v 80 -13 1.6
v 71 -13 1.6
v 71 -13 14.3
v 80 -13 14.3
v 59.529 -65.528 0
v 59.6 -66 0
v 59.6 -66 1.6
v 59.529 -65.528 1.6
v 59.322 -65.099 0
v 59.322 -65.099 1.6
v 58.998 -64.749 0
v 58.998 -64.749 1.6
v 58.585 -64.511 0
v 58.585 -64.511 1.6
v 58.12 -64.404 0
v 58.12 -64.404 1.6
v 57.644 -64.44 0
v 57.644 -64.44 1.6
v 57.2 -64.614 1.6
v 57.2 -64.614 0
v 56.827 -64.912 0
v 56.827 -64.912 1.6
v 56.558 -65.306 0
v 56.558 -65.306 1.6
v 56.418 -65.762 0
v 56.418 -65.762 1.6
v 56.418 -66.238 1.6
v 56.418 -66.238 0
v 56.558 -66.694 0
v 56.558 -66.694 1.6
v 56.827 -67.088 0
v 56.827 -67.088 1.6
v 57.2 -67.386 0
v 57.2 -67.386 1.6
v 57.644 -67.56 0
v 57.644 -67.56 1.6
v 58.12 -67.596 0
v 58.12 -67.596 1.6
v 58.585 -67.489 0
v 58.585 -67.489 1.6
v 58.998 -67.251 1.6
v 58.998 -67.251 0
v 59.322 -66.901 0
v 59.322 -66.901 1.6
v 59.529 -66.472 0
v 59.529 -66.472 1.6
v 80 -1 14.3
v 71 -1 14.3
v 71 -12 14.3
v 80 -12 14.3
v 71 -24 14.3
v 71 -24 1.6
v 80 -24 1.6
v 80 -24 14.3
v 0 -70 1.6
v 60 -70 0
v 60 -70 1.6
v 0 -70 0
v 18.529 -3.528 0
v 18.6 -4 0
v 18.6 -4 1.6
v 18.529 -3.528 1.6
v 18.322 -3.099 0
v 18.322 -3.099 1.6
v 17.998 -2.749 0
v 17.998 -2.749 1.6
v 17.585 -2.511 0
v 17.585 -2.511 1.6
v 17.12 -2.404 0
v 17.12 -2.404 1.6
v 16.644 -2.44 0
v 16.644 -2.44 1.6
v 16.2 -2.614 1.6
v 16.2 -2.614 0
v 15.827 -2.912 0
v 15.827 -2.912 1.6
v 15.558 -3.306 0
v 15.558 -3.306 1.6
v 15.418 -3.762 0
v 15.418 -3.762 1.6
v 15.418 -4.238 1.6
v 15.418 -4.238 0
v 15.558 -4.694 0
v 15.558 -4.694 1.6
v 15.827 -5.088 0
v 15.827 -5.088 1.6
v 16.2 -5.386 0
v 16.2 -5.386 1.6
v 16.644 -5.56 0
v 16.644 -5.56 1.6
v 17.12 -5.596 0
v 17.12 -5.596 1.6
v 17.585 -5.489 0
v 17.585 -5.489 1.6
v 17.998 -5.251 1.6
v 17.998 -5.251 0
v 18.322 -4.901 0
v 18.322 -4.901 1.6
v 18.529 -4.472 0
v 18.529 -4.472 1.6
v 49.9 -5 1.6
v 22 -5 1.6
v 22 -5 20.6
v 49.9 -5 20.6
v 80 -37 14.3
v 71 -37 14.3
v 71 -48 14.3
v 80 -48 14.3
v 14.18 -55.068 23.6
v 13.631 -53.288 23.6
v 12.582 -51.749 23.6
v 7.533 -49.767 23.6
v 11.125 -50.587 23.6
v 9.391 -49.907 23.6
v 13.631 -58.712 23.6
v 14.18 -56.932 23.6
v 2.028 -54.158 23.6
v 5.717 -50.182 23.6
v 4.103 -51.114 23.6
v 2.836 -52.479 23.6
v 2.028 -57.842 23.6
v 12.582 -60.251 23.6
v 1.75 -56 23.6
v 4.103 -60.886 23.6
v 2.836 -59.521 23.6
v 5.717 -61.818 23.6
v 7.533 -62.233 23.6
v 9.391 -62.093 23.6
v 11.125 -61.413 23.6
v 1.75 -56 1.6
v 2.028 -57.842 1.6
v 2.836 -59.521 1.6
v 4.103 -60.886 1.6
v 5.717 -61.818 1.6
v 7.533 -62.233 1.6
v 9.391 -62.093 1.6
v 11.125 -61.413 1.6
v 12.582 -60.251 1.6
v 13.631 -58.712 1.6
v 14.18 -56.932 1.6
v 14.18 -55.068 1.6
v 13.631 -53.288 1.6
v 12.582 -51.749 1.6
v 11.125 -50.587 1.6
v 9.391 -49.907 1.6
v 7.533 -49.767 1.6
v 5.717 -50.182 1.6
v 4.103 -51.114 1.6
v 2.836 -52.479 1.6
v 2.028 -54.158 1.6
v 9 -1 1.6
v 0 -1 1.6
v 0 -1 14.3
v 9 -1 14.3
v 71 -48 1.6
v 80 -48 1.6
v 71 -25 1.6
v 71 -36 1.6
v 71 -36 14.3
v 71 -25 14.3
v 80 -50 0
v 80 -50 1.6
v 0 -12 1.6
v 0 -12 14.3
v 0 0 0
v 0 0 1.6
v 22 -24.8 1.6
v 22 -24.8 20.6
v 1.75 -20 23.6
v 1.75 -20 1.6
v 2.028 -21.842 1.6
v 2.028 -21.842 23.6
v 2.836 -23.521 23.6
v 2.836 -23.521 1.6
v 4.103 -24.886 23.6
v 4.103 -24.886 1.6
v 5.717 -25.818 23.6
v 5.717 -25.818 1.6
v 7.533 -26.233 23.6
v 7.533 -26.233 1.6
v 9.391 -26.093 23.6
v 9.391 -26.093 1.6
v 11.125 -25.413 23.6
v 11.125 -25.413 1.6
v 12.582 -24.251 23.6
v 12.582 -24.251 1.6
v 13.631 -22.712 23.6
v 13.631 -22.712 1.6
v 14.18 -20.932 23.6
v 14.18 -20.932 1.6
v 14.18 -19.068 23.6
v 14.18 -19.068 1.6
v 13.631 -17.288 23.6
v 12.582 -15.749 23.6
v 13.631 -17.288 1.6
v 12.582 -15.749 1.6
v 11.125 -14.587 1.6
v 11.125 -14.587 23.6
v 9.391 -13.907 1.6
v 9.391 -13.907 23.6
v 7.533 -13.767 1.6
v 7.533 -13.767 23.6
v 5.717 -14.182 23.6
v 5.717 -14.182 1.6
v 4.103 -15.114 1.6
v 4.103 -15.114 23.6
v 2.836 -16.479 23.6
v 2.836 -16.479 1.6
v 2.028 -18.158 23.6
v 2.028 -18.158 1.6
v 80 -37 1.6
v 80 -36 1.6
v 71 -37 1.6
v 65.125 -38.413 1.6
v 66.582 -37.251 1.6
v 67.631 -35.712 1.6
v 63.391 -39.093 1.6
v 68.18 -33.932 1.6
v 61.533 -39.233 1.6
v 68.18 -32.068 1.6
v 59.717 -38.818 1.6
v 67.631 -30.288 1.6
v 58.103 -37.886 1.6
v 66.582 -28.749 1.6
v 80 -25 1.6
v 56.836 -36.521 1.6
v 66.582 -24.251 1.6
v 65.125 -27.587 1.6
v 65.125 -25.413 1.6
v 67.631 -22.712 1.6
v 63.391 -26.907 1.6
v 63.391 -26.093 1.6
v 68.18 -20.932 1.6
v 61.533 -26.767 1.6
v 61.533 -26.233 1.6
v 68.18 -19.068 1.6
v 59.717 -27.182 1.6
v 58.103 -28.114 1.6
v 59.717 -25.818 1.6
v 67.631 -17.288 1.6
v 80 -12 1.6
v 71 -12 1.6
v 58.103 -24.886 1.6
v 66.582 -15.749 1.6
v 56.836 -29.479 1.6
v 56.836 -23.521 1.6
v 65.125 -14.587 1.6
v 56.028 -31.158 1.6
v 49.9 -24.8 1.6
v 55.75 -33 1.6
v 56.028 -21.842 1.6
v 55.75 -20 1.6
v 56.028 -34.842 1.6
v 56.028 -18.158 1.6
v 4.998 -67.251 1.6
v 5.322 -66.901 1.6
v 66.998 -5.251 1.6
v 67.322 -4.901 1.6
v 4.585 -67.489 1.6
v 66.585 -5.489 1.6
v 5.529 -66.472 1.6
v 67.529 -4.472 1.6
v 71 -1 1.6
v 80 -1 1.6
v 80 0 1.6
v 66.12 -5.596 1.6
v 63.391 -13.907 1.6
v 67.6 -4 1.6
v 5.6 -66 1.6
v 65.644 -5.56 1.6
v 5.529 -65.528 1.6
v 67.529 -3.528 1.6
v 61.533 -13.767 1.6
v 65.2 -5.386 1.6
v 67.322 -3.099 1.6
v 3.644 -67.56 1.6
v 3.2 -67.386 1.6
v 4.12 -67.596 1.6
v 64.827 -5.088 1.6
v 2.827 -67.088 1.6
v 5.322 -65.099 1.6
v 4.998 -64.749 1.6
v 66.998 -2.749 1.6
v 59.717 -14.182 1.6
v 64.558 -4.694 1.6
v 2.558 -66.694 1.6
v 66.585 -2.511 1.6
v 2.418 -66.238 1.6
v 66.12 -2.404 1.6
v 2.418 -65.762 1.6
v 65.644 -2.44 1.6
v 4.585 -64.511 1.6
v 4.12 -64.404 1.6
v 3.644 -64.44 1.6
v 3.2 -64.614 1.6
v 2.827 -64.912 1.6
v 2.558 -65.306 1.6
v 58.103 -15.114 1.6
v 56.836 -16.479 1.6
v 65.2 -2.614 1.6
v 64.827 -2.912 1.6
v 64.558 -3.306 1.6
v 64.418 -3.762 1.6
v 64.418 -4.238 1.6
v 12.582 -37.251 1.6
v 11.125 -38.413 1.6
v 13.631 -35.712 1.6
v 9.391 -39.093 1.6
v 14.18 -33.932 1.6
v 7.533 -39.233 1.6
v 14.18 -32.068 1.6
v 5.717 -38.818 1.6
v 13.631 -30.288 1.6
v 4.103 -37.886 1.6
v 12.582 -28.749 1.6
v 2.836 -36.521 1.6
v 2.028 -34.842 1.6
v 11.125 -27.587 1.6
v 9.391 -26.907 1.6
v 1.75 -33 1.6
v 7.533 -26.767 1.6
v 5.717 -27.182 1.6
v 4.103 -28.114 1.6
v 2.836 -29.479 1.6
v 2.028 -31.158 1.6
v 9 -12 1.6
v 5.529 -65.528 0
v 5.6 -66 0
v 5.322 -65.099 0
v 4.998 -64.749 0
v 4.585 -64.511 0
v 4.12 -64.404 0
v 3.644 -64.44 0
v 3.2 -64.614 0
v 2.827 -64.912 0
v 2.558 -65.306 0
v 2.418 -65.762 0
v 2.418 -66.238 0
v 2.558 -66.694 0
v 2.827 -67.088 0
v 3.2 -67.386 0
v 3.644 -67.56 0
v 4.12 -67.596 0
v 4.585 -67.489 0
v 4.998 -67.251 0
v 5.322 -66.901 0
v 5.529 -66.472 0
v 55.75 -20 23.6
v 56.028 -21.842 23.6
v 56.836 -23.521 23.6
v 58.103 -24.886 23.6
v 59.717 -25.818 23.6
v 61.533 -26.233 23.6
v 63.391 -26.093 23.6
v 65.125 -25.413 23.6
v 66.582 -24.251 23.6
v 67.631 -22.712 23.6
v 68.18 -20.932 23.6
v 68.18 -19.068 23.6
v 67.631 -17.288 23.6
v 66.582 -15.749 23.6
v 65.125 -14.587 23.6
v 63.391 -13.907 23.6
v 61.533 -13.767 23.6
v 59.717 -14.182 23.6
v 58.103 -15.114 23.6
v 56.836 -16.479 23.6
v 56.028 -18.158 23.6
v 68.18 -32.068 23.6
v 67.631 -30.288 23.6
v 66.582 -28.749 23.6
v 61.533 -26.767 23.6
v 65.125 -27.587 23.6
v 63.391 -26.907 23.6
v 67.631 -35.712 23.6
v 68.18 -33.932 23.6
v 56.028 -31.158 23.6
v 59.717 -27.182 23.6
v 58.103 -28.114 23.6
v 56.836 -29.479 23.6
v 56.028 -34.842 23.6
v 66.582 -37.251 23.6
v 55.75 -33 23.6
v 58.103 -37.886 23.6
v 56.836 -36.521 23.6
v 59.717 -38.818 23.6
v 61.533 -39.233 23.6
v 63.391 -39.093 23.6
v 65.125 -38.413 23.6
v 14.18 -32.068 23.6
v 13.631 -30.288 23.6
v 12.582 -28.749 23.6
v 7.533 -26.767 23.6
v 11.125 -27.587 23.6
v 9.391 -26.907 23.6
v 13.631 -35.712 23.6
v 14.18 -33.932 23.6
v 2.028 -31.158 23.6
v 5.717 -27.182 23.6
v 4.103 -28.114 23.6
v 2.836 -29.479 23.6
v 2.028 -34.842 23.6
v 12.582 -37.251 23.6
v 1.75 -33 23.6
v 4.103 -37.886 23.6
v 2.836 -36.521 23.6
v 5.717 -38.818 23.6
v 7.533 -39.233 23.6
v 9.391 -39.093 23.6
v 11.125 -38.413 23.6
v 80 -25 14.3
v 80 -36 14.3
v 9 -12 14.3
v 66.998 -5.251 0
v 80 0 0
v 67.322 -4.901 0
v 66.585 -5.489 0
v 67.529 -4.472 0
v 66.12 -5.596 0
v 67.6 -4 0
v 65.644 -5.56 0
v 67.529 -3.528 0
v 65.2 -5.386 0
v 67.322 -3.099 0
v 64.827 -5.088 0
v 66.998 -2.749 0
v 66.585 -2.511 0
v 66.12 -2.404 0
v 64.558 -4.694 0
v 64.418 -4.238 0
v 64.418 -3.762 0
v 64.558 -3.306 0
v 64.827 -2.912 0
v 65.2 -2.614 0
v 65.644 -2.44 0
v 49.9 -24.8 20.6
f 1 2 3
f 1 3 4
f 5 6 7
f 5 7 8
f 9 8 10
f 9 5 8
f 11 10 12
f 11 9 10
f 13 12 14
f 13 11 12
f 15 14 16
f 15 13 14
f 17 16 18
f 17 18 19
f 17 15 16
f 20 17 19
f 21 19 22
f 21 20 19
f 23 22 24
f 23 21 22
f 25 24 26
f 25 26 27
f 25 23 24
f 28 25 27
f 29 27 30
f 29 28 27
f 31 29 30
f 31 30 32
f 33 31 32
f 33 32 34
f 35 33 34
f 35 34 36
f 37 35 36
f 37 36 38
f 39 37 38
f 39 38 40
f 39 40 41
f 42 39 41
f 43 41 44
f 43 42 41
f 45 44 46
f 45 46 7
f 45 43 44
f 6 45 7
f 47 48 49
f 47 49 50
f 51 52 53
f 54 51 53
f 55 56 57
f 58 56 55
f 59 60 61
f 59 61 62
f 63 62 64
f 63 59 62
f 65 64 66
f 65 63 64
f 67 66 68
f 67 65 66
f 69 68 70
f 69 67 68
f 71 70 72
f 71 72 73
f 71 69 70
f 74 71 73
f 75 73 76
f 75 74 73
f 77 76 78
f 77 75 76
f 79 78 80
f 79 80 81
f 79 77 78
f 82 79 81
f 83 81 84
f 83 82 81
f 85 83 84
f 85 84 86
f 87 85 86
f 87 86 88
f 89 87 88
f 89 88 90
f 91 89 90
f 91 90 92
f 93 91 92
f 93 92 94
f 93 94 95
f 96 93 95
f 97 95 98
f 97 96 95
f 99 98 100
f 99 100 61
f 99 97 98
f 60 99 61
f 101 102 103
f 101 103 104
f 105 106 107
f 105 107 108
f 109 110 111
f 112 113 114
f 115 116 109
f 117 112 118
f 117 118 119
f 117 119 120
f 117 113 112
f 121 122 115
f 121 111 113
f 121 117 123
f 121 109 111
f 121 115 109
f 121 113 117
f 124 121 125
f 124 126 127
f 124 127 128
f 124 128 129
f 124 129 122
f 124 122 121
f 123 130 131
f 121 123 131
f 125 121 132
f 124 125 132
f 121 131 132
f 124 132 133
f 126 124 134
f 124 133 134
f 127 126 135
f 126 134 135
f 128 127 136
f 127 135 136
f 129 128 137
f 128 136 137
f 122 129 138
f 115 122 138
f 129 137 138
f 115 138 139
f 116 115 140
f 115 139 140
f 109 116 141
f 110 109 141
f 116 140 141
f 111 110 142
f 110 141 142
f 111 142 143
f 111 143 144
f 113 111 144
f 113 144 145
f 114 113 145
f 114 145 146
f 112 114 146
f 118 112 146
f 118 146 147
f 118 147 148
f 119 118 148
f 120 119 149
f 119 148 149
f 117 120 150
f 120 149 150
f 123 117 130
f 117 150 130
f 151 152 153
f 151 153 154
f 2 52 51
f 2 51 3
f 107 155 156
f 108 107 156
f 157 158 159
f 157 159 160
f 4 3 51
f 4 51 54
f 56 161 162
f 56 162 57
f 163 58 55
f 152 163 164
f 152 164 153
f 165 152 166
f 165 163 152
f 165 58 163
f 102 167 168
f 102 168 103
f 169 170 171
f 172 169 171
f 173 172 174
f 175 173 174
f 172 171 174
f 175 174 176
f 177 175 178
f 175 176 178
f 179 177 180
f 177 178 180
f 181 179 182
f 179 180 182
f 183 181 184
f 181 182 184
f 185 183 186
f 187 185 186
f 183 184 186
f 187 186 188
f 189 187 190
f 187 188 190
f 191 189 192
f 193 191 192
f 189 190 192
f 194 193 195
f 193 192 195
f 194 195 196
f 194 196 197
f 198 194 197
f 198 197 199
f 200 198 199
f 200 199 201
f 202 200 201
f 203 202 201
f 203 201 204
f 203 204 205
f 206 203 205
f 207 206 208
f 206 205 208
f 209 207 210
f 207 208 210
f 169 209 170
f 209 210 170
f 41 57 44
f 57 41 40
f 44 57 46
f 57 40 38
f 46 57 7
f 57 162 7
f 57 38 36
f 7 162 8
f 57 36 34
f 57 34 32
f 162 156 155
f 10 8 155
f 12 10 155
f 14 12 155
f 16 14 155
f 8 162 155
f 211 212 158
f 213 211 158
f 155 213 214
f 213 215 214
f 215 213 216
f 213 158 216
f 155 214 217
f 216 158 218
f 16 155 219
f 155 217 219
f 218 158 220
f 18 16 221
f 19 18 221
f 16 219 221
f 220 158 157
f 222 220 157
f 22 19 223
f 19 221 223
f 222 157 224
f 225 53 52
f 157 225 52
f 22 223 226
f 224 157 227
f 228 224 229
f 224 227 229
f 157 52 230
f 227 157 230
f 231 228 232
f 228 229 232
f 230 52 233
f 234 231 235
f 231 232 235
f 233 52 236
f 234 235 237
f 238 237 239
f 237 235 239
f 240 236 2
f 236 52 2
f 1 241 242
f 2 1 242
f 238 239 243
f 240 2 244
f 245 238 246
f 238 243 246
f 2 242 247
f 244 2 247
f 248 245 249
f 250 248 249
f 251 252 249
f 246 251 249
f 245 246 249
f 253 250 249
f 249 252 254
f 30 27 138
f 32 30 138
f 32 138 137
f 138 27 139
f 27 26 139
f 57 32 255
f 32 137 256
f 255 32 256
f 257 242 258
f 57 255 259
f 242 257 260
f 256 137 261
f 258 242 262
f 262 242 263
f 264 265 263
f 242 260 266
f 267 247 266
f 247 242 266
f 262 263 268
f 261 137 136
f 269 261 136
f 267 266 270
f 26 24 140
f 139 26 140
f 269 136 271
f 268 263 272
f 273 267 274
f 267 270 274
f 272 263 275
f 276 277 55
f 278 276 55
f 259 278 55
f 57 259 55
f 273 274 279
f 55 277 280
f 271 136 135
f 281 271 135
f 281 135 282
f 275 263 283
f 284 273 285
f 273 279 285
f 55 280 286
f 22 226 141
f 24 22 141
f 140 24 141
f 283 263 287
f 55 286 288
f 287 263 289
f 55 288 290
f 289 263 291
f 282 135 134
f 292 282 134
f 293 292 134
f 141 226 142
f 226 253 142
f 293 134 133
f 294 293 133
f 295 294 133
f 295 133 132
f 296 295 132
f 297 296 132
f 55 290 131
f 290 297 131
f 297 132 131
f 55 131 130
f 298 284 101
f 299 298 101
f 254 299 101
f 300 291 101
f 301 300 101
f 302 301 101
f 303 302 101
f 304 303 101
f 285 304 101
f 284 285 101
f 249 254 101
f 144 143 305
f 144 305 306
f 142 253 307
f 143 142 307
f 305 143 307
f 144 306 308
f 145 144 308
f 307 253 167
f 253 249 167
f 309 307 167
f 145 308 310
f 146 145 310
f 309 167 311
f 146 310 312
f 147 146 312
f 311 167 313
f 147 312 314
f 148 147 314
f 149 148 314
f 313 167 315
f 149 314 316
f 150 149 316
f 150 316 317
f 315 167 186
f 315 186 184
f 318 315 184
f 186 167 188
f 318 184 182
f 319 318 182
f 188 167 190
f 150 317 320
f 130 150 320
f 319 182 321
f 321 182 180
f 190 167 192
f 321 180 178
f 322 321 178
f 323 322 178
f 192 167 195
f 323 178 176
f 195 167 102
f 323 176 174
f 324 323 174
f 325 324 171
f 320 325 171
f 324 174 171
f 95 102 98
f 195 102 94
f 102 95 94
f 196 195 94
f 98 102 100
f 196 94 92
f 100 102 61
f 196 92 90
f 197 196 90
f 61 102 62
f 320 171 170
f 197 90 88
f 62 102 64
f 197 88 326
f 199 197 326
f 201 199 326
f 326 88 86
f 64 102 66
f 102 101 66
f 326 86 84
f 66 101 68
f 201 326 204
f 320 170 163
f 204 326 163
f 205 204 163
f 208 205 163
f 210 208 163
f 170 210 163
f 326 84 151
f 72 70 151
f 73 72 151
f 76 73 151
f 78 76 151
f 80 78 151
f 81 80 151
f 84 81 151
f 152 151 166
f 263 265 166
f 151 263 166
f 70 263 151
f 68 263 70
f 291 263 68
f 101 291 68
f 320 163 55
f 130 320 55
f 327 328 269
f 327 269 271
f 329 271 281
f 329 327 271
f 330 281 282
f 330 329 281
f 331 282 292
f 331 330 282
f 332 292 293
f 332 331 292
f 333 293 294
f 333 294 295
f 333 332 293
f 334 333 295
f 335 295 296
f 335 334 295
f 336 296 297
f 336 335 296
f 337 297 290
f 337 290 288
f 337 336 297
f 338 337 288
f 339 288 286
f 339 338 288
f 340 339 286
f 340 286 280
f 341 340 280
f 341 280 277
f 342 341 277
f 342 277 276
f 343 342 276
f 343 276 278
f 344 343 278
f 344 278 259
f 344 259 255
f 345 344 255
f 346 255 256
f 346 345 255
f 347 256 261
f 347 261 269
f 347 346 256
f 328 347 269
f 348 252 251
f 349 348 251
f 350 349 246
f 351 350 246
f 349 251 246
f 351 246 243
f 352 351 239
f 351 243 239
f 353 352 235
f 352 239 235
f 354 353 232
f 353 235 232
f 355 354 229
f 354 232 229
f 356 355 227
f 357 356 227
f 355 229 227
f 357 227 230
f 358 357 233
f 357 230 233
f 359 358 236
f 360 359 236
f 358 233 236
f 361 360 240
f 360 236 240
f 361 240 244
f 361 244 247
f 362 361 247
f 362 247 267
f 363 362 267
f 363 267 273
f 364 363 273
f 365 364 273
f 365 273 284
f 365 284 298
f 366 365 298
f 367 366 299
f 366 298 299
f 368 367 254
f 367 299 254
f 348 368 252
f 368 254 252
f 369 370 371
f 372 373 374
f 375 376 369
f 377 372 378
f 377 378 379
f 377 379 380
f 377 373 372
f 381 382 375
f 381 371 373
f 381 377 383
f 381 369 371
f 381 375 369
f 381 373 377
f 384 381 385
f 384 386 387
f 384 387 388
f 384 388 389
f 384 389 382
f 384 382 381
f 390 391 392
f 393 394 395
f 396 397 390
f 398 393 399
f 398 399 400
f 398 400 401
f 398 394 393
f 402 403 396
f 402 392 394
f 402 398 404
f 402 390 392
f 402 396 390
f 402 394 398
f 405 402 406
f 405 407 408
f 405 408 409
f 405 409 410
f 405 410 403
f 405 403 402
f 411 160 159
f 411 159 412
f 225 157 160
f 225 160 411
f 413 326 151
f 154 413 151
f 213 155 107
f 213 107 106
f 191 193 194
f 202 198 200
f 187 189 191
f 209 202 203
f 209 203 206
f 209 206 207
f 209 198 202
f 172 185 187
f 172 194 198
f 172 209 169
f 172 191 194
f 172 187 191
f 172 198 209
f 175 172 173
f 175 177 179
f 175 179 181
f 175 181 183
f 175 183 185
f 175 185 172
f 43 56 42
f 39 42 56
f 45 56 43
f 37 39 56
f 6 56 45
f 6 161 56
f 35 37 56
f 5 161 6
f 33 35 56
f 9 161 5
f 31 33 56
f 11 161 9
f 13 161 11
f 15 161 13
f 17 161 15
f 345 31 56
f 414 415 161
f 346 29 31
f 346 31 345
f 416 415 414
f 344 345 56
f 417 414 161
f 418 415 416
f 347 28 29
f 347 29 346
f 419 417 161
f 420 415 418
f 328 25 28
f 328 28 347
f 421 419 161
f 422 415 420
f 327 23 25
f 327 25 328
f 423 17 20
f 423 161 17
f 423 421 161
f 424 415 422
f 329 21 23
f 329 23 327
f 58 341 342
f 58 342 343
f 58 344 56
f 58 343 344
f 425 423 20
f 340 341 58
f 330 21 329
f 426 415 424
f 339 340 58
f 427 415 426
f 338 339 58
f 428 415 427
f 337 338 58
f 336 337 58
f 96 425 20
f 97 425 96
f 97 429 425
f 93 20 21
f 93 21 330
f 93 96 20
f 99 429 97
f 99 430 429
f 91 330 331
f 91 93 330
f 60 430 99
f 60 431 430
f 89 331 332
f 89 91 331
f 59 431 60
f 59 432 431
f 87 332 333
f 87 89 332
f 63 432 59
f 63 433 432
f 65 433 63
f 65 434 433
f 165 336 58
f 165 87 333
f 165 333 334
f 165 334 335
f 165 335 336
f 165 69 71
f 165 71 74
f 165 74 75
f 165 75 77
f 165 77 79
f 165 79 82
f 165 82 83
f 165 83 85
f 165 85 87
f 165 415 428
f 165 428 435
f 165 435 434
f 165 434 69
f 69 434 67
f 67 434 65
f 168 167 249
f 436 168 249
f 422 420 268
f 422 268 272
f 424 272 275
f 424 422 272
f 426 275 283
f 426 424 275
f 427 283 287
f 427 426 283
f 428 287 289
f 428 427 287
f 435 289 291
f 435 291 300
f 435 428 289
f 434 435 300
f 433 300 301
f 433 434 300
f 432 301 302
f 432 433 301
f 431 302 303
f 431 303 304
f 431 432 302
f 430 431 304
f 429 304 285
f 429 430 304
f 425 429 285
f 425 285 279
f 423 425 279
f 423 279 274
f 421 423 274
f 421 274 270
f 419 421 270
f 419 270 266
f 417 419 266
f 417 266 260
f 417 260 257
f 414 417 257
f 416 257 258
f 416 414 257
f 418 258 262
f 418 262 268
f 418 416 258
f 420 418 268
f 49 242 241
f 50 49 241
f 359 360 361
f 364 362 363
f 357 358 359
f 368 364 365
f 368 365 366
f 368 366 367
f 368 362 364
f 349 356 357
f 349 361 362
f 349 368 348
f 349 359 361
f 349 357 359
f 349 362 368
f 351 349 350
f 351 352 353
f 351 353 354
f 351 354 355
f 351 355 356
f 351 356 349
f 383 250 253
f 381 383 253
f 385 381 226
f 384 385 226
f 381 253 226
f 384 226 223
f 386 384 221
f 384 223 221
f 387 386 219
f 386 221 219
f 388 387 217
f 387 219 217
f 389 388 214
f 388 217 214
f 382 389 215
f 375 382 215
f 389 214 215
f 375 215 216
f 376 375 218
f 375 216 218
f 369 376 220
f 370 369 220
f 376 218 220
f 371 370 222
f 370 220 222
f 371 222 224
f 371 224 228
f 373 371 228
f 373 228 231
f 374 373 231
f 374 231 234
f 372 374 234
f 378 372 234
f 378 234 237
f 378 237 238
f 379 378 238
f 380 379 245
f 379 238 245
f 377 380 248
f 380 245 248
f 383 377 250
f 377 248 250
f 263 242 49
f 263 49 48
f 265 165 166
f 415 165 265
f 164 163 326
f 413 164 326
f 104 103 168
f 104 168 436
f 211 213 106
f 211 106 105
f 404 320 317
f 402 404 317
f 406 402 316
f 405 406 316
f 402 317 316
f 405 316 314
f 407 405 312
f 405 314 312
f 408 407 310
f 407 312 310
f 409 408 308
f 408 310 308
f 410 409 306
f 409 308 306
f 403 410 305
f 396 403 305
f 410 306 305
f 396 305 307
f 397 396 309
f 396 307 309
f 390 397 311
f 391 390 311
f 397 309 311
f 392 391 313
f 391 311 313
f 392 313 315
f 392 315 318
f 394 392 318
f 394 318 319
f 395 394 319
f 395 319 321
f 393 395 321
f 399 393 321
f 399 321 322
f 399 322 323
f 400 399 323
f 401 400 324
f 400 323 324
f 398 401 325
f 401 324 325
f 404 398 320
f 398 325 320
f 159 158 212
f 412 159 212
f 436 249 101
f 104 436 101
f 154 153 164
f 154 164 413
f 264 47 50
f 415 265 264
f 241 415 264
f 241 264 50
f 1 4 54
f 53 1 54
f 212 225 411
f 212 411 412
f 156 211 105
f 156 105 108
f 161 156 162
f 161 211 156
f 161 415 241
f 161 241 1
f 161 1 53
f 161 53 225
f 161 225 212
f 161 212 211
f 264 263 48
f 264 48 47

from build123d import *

# Parameters (mm, degrees)
ESQUISSE1_R        = 1.6
BOSS_EXTRU_1_DEPTH = 1.6
ESQUISSE2_W        = 9
ESQUISSE2_H        = 11
BOSS_EXTRU_2_DEPTH = 12.7
ESQUISSE3_R        = 6.25
BOSS_EXTRU_3_DEPTH = 22
ESQUISSE4_W        = 27.9
ESQUISSE4_H        = 19.8
BOSS_EXTRU_4_DEPTH = 19


with BuildPart() as part:
    # Esquisse1 → Boss.-Extru.1 (new body)
    with BuildSketch(Plane.XY):
        Polygon((0, 0), (80, 0), (80, -50), (60, -70), (0, -70), align=None)
        with Locations((17, -4)):
            Circle(ESQUISSE1_R, mode=Mode.SUBTRACT)
        with Locations((66, -4)):
            Circle(ESQUISSE1_R, mode=Mode.SUBTRACT)
        with Locations((58, -66)):
            Circle(ESQUISSE1_R, mode=Mode.SUBTRACT)
        with Locations((4, -66)):
            Circle(ESQUISSE1_R, mode=Mode.SUBTRACT)
    extrude(amount=BOSS_EXTRU_1_DEPTH)

    # Esquisse2 → Boss.-Extru.2 (add)
    with BuildSketch(Plane.XY.offset(1.6)):
        with Locations((4.5, -6.5)):
            Rectangle(ESQUISSE2_W, ESQUISSE2_H)
        with Locations((75.5, -6.5)):
            Rectangle(ESQUISSE2_W, ESQUISSE2_H)
        with Locations((75.5, -18.5)):
            Rectangle(ESQUISSE2_W, ESQUISSE2_H)
        with Locations((75.5, -30.5)):
            Rectangle(ESQUISSE2_W, ESQUISSE2_H)
        with Locations((75.5, -42.5)):
            Rectangle(ESQUISSE2_W, ESQUISSE2_H)
    extrude(amount=BOSS_EXTRU_2_DEPTH)

    # Esquisse3 → Boss.-Extru.3 (add)
    with BuildSketch(Plane.XY.offset(1.6)):
        with Locations(Location((8, -20, 0), (0, 0, 180))):
            Circle(ESQUISSE3_R)
        with Locations(Location((8, -33, 0), (0, 0, 180))):
            Circle(ESQUISSE3_R)
        with Locations(Location((8, -56, 0), (0, 0, 180))):
            Circle(ESQUISSE3_R)
        with Locations(Location((62, -20, 0), (0, 0, 180))):
            Circle(ESQUISSE3_R)
        with Locations(Location((62, -33, 0), (0, 0, 180))):
            Circle(ESQUISSE3_R)
    extrude(amount=BOSS_EXTRU_3_DEPTH)

    # Esquisse4 → Boss.-Extru.4 (add)
    with BuildSketch(Plane.XY.offset(1.6)):
        with Locations((35.95, -14.9)):
            Rectangle(ESQUISSE4_W, ESQUISSE4_H)
    extrude(amount=BOSS_EXTRU_4_DEPTH)


solid = part.part
